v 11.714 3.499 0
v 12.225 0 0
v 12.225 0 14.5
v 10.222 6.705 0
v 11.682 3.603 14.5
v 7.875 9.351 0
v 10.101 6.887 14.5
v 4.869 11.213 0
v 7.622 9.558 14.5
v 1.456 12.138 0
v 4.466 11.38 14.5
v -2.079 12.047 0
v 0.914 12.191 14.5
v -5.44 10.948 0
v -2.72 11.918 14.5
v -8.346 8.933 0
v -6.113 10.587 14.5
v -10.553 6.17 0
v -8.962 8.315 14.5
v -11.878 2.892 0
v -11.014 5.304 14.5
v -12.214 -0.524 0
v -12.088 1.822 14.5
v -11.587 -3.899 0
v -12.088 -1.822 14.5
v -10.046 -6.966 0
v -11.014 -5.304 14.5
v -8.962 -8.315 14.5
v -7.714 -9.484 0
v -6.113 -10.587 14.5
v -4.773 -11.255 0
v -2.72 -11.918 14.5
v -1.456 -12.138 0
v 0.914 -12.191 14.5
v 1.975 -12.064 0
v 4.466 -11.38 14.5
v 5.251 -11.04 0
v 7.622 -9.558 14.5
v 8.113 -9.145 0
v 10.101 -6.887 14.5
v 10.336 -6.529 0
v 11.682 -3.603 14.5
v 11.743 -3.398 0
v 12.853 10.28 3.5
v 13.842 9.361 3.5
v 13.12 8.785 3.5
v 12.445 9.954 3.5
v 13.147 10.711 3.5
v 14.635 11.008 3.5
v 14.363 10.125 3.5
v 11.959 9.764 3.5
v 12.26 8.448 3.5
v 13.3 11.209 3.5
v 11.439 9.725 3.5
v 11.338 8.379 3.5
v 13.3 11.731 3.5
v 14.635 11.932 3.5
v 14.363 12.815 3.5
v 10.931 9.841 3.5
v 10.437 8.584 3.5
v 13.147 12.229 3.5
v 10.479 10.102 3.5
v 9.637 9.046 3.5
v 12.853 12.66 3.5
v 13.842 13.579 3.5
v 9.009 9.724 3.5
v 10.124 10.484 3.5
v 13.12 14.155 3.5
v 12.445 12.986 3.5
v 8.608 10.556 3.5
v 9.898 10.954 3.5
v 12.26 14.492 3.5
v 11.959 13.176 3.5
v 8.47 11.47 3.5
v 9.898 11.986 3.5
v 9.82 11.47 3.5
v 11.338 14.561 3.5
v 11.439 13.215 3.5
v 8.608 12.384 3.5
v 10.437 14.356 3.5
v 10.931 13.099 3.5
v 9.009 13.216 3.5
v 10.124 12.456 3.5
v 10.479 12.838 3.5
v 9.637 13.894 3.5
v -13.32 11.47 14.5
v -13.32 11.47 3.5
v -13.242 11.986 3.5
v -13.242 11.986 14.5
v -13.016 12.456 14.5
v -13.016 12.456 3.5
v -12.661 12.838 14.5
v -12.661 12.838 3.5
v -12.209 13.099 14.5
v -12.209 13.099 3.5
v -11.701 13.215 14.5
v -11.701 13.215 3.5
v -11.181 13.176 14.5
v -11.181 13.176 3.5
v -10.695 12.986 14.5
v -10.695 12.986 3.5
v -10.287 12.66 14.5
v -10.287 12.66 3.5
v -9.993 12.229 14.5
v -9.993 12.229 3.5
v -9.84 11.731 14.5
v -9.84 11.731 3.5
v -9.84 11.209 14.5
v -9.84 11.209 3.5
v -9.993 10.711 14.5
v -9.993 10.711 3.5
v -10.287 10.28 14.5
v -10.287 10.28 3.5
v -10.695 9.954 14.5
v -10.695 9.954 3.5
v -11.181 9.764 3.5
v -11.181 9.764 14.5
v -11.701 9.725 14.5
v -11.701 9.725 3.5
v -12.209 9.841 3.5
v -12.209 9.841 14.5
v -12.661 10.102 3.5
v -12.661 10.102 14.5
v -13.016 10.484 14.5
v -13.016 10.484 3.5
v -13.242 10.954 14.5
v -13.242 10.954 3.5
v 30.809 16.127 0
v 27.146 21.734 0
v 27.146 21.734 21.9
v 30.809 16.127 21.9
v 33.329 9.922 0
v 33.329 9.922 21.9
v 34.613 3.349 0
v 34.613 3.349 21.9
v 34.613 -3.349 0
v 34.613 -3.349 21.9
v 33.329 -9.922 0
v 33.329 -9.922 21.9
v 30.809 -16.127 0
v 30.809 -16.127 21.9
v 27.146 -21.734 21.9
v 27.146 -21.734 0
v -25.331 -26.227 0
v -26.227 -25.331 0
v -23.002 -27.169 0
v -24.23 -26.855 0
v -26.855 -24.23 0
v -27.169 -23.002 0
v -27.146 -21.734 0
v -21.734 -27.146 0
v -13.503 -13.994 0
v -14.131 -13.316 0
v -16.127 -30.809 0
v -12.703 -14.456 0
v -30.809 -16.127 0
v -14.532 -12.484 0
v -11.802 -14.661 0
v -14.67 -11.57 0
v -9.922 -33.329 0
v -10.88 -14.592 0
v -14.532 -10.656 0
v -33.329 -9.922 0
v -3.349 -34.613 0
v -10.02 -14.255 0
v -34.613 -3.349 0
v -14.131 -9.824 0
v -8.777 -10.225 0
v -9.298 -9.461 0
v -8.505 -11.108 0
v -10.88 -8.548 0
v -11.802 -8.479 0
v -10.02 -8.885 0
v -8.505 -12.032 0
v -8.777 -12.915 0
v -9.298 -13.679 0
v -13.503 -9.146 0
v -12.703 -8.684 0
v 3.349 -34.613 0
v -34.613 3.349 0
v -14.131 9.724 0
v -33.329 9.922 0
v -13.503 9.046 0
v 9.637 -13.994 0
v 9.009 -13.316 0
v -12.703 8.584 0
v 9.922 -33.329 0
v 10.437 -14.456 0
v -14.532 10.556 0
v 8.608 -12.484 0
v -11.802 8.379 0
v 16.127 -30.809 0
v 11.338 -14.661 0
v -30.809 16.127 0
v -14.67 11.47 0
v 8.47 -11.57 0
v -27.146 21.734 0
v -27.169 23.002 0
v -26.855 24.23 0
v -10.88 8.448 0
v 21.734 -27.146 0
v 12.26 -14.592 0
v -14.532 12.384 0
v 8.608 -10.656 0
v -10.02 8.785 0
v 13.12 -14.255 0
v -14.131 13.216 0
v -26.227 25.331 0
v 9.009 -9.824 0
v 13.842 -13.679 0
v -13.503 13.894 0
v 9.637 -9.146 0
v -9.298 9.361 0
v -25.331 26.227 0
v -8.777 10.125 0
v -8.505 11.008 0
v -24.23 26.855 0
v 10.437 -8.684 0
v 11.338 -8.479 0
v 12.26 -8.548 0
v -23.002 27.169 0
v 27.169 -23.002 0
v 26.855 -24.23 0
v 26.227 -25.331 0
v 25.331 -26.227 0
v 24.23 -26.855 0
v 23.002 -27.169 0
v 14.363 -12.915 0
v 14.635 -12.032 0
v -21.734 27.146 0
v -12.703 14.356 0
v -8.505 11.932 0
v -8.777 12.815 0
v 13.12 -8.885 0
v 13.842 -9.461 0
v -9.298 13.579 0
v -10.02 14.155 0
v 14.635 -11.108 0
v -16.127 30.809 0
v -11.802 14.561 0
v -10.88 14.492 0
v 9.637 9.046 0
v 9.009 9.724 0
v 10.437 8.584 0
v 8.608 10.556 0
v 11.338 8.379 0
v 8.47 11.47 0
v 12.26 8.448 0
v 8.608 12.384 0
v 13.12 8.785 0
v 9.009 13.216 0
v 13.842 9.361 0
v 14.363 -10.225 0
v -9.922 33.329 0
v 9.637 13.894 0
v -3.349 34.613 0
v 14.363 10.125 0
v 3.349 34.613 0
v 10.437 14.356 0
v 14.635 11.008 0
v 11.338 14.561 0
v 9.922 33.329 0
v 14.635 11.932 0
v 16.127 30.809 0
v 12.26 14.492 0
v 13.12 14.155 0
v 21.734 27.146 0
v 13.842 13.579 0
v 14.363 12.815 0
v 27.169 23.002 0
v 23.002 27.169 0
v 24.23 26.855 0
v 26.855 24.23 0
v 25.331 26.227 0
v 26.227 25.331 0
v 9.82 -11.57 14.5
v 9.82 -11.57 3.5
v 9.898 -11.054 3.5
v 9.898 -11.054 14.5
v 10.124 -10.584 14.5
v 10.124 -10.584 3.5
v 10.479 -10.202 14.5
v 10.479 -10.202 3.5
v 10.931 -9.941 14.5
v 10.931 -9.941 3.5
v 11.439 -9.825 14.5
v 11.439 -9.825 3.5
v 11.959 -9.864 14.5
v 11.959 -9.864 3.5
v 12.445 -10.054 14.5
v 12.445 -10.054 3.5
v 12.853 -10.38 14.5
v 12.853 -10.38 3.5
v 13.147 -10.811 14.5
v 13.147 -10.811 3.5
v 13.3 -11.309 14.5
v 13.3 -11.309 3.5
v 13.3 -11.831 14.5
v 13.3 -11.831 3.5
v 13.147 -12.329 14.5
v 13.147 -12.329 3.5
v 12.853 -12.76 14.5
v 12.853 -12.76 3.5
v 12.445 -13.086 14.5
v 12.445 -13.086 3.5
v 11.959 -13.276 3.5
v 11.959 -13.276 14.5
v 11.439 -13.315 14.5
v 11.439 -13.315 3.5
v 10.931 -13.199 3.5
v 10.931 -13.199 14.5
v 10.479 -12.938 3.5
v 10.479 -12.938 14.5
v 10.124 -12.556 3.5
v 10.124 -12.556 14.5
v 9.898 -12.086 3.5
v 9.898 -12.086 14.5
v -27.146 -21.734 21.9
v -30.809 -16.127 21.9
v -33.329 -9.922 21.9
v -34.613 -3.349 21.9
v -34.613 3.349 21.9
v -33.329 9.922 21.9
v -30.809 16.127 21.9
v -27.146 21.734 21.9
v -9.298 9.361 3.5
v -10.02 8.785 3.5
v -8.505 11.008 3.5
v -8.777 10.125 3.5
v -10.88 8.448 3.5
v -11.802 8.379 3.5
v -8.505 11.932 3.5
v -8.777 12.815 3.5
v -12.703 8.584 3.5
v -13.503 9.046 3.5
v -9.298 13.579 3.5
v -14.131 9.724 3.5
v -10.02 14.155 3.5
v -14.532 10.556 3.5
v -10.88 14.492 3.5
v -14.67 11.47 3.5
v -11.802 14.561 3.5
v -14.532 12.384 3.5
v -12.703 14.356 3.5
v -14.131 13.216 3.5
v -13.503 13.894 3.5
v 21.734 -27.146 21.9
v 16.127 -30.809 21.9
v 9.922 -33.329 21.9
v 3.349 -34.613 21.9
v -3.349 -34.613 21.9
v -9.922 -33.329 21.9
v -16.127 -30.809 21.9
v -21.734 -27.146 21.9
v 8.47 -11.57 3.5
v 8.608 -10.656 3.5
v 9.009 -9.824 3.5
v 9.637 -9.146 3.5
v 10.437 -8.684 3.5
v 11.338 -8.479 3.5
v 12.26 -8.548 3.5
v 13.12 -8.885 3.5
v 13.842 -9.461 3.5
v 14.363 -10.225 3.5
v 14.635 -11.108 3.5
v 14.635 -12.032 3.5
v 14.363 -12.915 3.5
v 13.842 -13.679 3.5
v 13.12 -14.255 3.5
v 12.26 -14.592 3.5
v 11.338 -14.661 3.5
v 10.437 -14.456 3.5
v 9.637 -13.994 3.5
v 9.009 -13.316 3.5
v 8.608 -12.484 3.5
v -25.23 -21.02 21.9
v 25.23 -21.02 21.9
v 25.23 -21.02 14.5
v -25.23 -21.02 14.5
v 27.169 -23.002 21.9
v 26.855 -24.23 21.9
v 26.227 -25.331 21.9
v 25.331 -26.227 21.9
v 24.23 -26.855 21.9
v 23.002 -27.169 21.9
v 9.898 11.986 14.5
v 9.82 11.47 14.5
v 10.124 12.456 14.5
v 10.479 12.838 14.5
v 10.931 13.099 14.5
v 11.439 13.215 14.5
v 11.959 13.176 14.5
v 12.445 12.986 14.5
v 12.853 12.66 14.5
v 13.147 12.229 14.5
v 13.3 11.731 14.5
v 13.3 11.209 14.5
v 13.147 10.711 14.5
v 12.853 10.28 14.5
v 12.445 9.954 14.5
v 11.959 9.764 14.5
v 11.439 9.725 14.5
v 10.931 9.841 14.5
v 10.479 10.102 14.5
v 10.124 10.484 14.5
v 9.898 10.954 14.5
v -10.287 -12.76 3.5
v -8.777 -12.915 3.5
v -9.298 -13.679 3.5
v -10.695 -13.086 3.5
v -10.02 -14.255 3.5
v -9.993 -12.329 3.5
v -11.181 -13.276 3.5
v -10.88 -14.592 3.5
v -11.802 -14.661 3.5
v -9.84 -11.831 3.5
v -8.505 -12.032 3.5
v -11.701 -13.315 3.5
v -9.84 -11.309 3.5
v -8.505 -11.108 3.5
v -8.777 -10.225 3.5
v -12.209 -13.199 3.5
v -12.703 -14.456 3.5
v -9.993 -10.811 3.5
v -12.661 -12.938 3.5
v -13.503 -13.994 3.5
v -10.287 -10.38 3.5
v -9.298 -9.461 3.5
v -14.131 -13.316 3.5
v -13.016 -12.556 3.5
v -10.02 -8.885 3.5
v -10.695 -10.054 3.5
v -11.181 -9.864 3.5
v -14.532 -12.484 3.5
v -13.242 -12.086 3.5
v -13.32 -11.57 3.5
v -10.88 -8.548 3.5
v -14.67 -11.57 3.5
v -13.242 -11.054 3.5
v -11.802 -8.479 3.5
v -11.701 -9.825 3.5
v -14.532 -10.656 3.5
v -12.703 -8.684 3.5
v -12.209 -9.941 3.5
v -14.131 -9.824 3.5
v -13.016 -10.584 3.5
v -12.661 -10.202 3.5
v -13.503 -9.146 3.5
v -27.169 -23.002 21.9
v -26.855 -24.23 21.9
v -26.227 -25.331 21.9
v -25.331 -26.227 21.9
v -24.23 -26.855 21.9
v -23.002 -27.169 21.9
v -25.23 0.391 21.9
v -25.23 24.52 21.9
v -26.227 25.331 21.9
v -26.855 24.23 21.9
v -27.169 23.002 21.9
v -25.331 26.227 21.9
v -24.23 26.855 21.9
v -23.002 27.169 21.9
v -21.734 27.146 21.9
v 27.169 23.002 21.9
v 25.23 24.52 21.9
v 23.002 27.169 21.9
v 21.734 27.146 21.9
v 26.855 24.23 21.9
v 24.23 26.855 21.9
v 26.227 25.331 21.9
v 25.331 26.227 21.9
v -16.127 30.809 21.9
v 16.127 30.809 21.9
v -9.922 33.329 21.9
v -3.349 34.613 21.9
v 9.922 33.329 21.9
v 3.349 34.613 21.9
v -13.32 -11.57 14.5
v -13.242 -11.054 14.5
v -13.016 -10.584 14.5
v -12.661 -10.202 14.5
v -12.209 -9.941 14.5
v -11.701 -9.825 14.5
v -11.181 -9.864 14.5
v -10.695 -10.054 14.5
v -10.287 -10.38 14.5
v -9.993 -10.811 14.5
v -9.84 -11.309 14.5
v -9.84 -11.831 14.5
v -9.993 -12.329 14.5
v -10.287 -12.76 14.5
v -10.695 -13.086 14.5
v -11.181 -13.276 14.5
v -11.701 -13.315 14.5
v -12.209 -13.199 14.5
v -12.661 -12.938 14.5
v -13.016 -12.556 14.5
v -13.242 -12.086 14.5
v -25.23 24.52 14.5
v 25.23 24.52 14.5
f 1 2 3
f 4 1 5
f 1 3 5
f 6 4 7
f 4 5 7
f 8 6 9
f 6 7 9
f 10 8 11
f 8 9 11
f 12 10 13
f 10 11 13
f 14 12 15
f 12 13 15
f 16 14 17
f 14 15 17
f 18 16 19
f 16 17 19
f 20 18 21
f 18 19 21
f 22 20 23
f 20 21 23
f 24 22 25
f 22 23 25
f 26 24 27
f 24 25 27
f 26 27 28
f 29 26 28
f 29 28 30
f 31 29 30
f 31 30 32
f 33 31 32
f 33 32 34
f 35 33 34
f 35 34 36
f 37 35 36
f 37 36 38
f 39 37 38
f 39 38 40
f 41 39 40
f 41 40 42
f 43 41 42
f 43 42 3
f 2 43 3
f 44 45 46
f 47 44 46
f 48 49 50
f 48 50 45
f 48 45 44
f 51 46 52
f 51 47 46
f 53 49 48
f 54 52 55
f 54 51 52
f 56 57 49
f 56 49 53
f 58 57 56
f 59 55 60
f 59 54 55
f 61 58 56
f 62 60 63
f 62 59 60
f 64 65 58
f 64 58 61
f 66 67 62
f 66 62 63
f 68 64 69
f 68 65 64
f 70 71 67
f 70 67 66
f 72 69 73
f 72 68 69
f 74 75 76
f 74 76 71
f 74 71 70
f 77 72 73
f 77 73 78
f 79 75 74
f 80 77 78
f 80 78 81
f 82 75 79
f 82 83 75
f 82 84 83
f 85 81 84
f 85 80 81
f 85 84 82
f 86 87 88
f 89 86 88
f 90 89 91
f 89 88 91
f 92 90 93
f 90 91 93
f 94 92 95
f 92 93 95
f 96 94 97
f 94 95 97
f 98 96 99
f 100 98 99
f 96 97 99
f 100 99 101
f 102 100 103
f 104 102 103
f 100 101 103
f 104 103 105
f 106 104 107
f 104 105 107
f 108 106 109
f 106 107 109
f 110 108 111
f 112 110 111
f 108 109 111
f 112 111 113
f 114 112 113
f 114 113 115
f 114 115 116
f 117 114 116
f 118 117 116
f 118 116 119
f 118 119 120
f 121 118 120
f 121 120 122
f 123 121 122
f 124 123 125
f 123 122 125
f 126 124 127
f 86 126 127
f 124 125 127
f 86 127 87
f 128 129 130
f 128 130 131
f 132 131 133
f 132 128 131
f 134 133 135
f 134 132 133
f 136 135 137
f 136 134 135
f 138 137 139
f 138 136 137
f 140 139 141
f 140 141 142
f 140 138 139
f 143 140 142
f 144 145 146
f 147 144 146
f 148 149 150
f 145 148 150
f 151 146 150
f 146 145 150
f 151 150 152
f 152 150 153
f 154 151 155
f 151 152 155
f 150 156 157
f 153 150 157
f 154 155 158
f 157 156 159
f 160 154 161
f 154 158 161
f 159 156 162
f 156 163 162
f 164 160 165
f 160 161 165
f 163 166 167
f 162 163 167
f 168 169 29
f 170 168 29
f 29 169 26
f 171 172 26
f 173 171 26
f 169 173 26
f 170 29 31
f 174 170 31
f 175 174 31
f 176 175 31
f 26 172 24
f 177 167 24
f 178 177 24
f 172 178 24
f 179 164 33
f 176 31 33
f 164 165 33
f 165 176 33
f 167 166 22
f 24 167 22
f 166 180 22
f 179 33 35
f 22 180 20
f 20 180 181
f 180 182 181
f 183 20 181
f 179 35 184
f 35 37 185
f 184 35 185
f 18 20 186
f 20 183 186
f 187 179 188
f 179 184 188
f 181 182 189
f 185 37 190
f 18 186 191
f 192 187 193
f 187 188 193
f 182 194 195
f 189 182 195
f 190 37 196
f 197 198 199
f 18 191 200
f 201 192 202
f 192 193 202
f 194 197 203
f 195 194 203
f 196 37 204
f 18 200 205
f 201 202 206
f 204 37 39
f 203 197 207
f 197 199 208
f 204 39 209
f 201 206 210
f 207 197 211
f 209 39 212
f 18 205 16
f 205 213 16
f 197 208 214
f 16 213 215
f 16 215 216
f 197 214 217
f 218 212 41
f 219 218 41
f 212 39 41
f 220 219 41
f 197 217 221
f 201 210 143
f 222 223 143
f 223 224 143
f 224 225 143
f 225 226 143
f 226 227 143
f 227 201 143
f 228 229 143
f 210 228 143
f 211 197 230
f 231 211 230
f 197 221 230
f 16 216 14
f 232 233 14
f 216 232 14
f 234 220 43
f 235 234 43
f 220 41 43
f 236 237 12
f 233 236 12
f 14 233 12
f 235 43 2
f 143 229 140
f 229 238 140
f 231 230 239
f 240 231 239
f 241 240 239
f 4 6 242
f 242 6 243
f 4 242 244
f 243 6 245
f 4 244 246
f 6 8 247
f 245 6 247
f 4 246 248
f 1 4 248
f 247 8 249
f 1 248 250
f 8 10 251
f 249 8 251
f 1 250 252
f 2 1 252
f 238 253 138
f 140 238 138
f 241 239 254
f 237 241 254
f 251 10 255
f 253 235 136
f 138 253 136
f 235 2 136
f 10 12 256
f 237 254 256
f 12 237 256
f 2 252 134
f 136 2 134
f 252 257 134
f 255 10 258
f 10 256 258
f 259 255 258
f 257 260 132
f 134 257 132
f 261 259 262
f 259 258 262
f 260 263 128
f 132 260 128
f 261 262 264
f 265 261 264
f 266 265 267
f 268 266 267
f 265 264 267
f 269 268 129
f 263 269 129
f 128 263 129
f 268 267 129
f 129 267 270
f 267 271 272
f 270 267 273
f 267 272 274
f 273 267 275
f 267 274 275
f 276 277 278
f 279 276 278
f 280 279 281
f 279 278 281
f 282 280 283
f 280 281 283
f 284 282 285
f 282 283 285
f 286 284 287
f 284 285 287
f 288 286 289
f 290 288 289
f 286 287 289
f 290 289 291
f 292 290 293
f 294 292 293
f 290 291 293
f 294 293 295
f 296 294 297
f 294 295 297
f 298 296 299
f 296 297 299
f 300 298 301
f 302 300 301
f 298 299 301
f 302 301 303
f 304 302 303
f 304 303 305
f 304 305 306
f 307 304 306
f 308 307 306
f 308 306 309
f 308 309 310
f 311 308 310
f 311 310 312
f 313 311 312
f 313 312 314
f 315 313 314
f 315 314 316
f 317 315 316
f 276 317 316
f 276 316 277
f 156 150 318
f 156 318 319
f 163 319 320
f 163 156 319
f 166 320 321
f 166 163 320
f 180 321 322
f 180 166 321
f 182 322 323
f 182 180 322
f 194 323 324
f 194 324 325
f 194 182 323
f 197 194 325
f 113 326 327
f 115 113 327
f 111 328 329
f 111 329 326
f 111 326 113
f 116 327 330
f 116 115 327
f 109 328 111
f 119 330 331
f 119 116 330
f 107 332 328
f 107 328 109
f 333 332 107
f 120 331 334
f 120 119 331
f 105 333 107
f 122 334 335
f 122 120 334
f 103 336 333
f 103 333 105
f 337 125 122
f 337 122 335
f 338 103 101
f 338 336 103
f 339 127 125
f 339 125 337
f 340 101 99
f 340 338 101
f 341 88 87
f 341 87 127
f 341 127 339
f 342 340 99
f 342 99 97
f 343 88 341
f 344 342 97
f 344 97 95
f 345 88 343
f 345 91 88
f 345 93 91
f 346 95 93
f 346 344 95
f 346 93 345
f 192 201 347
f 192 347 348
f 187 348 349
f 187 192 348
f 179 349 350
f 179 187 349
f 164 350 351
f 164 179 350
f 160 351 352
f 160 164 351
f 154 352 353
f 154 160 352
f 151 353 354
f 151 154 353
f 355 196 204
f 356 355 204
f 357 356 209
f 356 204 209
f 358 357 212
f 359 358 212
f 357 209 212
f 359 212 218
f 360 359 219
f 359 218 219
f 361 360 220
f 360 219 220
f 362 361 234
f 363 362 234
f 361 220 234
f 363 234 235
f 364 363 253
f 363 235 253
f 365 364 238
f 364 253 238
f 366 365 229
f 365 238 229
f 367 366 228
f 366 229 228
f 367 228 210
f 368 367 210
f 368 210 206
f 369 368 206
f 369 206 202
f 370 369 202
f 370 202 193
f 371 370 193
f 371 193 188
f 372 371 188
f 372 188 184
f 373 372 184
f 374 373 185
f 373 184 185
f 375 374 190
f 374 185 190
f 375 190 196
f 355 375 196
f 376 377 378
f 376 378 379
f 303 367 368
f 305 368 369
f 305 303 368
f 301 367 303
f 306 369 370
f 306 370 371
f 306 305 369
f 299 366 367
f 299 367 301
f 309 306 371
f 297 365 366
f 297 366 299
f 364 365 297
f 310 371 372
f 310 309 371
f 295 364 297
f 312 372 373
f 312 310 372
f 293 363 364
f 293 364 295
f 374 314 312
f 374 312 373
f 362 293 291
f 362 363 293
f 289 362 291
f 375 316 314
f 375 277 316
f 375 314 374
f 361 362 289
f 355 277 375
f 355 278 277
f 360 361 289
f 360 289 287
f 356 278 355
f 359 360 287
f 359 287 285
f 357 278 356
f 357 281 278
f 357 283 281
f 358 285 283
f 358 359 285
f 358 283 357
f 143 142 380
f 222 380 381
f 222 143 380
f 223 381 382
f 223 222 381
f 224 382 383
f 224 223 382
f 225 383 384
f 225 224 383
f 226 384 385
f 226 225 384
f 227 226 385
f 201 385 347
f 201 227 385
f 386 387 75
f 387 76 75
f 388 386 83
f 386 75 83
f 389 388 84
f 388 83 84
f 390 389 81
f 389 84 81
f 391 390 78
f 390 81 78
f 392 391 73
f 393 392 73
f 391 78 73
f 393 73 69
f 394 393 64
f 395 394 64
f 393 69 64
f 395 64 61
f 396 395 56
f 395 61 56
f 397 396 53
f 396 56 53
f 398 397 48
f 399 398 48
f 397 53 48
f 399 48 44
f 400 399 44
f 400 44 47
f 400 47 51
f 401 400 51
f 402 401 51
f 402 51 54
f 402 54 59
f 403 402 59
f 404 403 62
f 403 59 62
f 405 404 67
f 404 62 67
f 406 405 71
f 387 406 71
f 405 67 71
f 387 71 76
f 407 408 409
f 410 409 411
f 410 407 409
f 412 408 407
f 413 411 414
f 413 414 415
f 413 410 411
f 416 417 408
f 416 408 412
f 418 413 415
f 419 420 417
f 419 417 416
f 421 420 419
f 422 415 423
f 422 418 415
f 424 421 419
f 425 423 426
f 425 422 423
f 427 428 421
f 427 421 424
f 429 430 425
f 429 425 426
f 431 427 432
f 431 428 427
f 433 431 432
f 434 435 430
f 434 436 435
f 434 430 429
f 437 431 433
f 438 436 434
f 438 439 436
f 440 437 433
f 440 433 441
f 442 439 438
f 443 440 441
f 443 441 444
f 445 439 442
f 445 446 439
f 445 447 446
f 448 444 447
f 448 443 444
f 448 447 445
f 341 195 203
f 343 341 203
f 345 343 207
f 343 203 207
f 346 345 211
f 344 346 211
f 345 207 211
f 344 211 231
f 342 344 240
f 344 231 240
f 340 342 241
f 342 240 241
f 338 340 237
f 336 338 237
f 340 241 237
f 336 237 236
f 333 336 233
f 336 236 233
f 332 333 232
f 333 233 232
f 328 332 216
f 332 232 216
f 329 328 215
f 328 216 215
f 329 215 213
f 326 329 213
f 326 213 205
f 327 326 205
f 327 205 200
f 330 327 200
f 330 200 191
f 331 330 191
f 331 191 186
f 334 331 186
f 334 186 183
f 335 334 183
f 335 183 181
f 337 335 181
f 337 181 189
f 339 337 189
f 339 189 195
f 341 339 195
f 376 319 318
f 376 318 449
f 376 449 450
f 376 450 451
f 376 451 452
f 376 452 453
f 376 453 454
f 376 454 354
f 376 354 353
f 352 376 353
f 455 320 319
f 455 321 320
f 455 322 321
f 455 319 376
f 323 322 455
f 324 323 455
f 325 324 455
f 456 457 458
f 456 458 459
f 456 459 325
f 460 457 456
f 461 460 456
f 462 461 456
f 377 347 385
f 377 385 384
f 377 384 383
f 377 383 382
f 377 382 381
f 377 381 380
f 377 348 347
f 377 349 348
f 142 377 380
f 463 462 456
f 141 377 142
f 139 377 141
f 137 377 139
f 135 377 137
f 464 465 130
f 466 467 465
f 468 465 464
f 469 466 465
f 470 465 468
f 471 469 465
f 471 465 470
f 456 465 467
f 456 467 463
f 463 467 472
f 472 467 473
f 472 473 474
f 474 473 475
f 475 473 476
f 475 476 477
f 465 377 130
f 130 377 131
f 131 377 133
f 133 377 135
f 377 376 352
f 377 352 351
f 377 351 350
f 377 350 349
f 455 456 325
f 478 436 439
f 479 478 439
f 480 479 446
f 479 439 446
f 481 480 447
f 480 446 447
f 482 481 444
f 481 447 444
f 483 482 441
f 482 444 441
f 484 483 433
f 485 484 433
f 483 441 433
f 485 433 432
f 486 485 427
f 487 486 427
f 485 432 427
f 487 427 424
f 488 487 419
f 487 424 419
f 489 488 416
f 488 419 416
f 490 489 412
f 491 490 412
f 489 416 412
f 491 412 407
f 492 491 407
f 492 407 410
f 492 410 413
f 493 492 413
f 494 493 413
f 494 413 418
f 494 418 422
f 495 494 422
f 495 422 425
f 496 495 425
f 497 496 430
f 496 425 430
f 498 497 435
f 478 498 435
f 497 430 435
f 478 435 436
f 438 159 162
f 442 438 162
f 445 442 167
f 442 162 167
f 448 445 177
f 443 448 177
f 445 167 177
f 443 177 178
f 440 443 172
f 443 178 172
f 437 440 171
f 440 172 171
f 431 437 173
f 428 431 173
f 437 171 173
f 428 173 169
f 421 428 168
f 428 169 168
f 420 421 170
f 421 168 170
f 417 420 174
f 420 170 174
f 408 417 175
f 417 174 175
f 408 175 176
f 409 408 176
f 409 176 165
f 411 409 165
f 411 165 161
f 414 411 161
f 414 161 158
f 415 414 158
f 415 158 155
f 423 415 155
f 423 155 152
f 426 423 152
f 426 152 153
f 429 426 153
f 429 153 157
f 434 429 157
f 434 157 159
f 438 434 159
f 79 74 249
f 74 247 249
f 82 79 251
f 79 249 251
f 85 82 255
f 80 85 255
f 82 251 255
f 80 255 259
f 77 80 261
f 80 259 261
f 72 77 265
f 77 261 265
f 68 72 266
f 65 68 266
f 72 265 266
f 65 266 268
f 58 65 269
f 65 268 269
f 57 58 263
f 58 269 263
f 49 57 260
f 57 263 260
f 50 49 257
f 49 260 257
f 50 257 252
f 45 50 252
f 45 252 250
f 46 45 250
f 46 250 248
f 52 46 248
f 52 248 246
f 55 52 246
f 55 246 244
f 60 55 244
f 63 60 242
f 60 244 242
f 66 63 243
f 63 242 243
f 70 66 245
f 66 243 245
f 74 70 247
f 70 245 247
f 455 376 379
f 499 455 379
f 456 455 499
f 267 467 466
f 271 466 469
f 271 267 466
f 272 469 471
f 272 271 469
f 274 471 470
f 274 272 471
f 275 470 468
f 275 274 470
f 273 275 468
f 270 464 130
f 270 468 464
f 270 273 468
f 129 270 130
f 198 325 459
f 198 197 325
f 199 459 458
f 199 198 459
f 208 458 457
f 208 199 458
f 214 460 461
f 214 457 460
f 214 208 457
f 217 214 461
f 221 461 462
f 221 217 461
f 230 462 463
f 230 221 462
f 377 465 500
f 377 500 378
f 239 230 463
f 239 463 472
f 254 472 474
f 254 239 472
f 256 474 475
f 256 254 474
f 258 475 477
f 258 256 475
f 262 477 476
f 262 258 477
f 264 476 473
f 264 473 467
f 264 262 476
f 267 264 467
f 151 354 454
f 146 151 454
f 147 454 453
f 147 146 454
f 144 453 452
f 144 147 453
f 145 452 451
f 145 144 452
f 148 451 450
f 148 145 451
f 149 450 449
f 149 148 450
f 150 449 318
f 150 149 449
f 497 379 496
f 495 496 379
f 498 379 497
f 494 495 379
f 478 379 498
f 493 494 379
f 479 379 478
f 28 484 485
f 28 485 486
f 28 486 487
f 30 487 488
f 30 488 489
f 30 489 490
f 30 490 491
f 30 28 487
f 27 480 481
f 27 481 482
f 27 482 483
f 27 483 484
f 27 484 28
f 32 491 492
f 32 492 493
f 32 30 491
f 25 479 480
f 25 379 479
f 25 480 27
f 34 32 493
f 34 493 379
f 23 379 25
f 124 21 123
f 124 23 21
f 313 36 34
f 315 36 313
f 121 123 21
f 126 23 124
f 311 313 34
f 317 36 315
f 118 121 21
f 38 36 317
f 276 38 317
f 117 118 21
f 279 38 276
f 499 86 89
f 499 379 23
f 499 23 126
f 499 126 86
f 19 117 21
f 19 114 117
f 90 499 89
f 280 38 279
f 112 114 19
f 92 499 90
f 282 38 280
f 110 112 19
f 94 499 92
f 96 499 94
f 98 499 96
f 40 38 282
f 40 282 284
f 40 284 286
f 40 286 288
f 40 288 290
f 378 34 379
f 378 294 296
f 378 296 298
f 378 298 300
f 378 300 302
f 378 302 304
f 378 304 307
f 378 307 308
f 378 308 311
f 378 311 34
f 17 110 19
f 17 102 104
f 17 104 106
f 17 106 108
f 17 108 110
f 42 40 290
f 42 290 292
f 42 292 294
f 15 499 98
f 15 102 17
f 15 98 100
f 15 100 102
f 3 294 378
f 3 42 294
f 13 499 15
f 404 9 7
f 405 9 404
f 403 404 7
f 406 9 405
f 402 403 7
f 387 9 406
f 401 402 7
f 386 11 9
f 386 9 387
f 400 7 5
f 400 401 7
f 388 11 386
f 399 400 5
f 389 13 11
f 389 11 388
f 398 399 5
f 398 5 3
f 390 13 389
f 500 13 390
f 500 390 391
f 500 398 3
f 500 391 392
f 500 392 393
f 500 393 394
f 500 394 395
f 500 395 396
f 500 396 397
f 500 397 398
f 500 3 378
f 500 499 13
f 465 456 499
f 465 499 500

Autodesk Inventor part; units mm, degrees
ref_plane "YZ Plane" through (0, 0, 0) normal (1, 0, 0) x (0, 1, 0)
ref_plane "XZ Plane" through (0, 0, 0) normal (0, 1, 0) x (-1, 0, 0)
ref_plane "XY Plane" through (0, 0, 0) normal (0, 0, 1) x (1, 0, 0)
sketch "Sketch1" plane through (0, 0, 0) normal (0, 0, 1) x (1, 0, 0)
  circle A0 centre (0, 0) radius 11.25
  circle A1 centre (0, 0) radius 37.0304
  arc A2 (-32.7929, -17.201) -> (-31.2929, -19.799) centre (0, 0) ccw
  line L0 (-32.7929, -17.201) -> (-31.0547, -16.1974)
  line L1 (-32.7929, -17.201) -> (-31.0547, -16.1974)
  line L2 (-29.5547, -18.7955) -> (-31.2929, -19.799)
  line L3 (-31.2929, -19.799) -> (-29.5547, -18.7955)
  line L4 (-16.1974, -31.0547) -> (-17.201, -32.7929)
  line L5 (-17.201, -32.7929) -> (-16.1974, -31.0547)
  arc A3 (-19.799, -31.2929) -> (-17.201, -32.7929) centre (0, 0) ccw
  line L6 (-19.799, -31.2929) -> (-18.7955, -29.5547)
  line L7 (-19.799, -31.2929) -> (-18.7955, -29.5547)
  arc A4 (17.201, -32.7929) -> (19.799, -31.2929) centre (0, 0) ccw
  line L8 (17.201, -32.7929) -> (16.1974, -31.0547)
  line L9 (17.201, -32.7929) -> (16.1974, -31.0547)
  line L10 (18.7955, -29.5547) -> (19.799, -31.2929)
  line L11 (19.799, -31.2929) -> (18.7955, -29.5547)
  arc A5 (31.2929, -19.799) -> (32.7929, -17.201) centre (0, 0) ccw
  line L12 (31.2929, -19.799) -> (29.5547, -18.7955)
  line L13 (31.0547, -16.1974) -> (32.7929, -17.201)
  line L14 (32.7929, -17.201) -> (31.0547, -16.1974)
  line L15 (32.7929, 17.201) -> (31.0547, 16.1974)
  line L16 (32.7929, 17.201) -> (31.0547, 16.1974)
  arc A6 (32.7929, 17.201) -> (31.2929, 19.799) centre (0, 0) ccw
  line L17 (29.5547, 18.7955) -> (31.2929, 19.799)
  line L18 (31.2929, 19.799) -> (29.5547, 18.7955)
  line L19 (16.1974, 31.0547) -> (17.201, 32.7929)
  line L20 (17.201, 32.7929) -> (16.1974, 31.0547)
  line L21 (19.799, 31.2929) -> (18.7955, 29.5547)
  line L22 (19.799, 31.2929) -> (18.7955, 29.5547)
  line L23 (-17.201, 32.7929) -> (-16.1974, 31.0547)
  line L24 (-17.201, 32.7929) -> (-16.1974, 31.0547)
  line L25 (-18.7955, 29.5547) -> (-19.799, 31.2929)
  line L26 (-19.799, 31.2929) -> (-18.7955, 29.5547)
  arc A7 (-31.2929, 19.799) -> (-32.7929, 17.201) centre (0, 0) ccw
  line L27 (-31.2929, 19.799) -> (-29.5547, 18.7955)
  line L28 (-31.2929, 19.799) -> (-29.5547, 18.7955)
  line L29 (-31.0547, 16.1974) -> (-32.7929, 17.201)
  line L30 (-32.7929, 17.201) -> (-31.0547, 16.1974)
  arc A8 (-21.806, -27.4089) -> (-27.4089, -21.806) centre (-22.4506, -22.4506) ccw
  circle A9 centre (-31.75, 0) radius 5
  arc A10 (-3.9618, 34.8002) -> (-2.3096, 31.8679) centre (-22.4506, 22.4506) ccw
  circle A11 centre (-22.4506, 22.4506) radius 5
  circle A12 centre (22.4506, 22.4506) radius 5
  circle A13 centre (22.4506, 22.4506) radius 5
  arc A14 (-3.9618, -34.8002) -> (-1.7951, -38.6456) centre (22.4506, -22.4506) ccw
  circle A15 centre (22.4506, -22.4506) radius 5
  circle A16 centre (-22.4506, 22.4506) radius 4.75
  circle A17 centre (-22.4506, -22.4506) radius 4.75
  circle A18 centre (22.4506, -22.4506) radius 4.75
  circle A19 centre (22.4506, 22.4506) radius 4.75
  circle A20 centre (0, 0) radius 34.775
  circle A21 centre (0, 0) radius 36.75
  point P0 (0, 0)
  point P1 (0, 49.75)
  point P2 (27.1463, 21.7343)
  point P3 (21.7343, 27.1463)
  point P4 (-21.7343, 27.1463)
  point P5 (-27.1463, 21.7343)
  point P6 (-27.1463, -21.7343)
  point P7 (-21.7343, -27.1463)
  point P8 (21.7343, -27.1463)
  point P9 (27.1463, -21.7343)
  dimension "d6" = 70.05
  dimension "d8" = 74.0608
  dimension "d0" = 10
  dimension "d1" = 0.25
  dimension "d4" = 360
  dimension "d7" = 0.25
  dimension "d9" = 73.5
extrude "Extrusion1" add sketch "Sketch1" along normal blind 21.9 contours A0 A10 | A9 A20 A11 A12 A15 A8 | A9 A20 A10 | A10 A20 A9 | A10 A0 | A20 A16 A11 | A8 A20 A17 | A20 A16 | A16 A20 | A20 A17 | A17 A20 | A15 A20 A18 | A20 A19 A12 | A20 A18 | A18 A20 | A20 A19 | A19 A20 picked at (-31.3962, -1.5997) picked at (-30.2693, 2.6951) picked at (-26.6756, 20.1619) picked at (20.1869, -26.6901) picked at (20.1869, 26.6901)
sketch "Skizze6" plane through (0, 0, 21.9) normal (0, 0, 1) x (1, 0, 0)
  circle A0 centre (0, 0) radius 12.225
  dimension "d33" = 24.45
extrude "Extrusion6" cut sketch "Skizze6" against normal through all
sketch "Skizze7" plane through (0, 0, 21.9) normal (0, 0, 1) x (1, 0, 0)
  line L0 (0, 0) -> (0, 1.75)
  line L1 (-25.23, 24.52) -> (25.23, 24.52)
  line L2 (25.23, 24.52) -> (25.23, -21.02)
  line L3 (25.23, -21.02) -> (-25.23, -21.02)
  line L4 (-25.23, -21.02) -> (-25.23, 24.52)
  line L5 (-25.23, 24.52) -> (25.23, -21.02) construction
  line L6 (25.23, 24.52) -> (-25.23, -21.02) construction
  dimension "d48" = 1.75
  dimension "d49" = 50.46
  dimension "d50" = 45.54
extrude "Extrusion7" cut sketch "Skizze7" against normal blind 7.4
sketch "Skizze8" plane through (0, 0, 0) normal (0, 0, -1) x (-1, 0, 0)
  circle A0 centre (0, 0) radius 12.225 projected
  line L0 (-11.57, 11.47) -> (11.57, 11.47)
  line L1 (11.57, 11.57) -> (11.57, -11.57)
  line L2 (11.57, -11.57) -> (-11.57, -11.57)
  line L3 (-11.57, -11.57) -> (-11.57, 11.57)
  line L4 (-11.57, 11.57) -> (11.57, -11.57) construction
  line L5 (11.57, 11.57) -> (-11.57, -11.57) construction
  circle A1 centre (-11.57, 11.47) radius 1.75
  circle A2 centre (11.57, 11.47) radius 1.75
  circle A3 centre (11.57, -11.57) radius 1.75
  circle A4 centre (-11.57, -11.57) radius 1.75
  dimension "d40" = 23.14
  dimension "d41" = 23.14
  dimension "d42" = 3.5
  dimension "d43" = 3.5
  dimension "d44" = 3.5
  dimension "d45" = 3.5
extrude "Extrusion8" cut sketch "Skizze8" against normal through all contours A2 L0 L1 | L1 L0 A2 | A3 L2 L1 | L1 L2 A3 | A1 L3 L0 | L0 L3 A1 | A4 L3 L2 | L2 L3 A4
sketch "Skizze9" plane through (0, 0, 0) normal (0, 0, -1) x (-1, 0, 0)
  circle A0 centre (-11.57, 11.47) radius 1.75 projected
  circle A1 centre (11.57, 11.47) radius 1.75 projected
  circle A2 centre (11.57, -11.57) radius 1.75 projected
  circle A3 centre (-11.57, -11.57) radius 1.75 projected
  circle A4 centre (-11.57, 11.47) radius 3.1
  circle A5 centre (11.57, 11.47) radius 3.1
  circle A6 centre (11.57, -11.57) radius 3.1
  circle A7 centre (-11.57, -11.57) radius 3.1
  point P0 (0, 0)
  dimension "d51" = 6.2
  dimension "d52" = 6.2
  dimension "d53" = 6.2
  dimension "d54" = 6.2
extrude "Extrusion9" cut sketch "Skizze9" against normal blind 3.5 contours A0 | A1 | A2 | A3 | A4 | A5 | A6 | A7
properties part number "2024_08_26_beam_combiner_blende"
